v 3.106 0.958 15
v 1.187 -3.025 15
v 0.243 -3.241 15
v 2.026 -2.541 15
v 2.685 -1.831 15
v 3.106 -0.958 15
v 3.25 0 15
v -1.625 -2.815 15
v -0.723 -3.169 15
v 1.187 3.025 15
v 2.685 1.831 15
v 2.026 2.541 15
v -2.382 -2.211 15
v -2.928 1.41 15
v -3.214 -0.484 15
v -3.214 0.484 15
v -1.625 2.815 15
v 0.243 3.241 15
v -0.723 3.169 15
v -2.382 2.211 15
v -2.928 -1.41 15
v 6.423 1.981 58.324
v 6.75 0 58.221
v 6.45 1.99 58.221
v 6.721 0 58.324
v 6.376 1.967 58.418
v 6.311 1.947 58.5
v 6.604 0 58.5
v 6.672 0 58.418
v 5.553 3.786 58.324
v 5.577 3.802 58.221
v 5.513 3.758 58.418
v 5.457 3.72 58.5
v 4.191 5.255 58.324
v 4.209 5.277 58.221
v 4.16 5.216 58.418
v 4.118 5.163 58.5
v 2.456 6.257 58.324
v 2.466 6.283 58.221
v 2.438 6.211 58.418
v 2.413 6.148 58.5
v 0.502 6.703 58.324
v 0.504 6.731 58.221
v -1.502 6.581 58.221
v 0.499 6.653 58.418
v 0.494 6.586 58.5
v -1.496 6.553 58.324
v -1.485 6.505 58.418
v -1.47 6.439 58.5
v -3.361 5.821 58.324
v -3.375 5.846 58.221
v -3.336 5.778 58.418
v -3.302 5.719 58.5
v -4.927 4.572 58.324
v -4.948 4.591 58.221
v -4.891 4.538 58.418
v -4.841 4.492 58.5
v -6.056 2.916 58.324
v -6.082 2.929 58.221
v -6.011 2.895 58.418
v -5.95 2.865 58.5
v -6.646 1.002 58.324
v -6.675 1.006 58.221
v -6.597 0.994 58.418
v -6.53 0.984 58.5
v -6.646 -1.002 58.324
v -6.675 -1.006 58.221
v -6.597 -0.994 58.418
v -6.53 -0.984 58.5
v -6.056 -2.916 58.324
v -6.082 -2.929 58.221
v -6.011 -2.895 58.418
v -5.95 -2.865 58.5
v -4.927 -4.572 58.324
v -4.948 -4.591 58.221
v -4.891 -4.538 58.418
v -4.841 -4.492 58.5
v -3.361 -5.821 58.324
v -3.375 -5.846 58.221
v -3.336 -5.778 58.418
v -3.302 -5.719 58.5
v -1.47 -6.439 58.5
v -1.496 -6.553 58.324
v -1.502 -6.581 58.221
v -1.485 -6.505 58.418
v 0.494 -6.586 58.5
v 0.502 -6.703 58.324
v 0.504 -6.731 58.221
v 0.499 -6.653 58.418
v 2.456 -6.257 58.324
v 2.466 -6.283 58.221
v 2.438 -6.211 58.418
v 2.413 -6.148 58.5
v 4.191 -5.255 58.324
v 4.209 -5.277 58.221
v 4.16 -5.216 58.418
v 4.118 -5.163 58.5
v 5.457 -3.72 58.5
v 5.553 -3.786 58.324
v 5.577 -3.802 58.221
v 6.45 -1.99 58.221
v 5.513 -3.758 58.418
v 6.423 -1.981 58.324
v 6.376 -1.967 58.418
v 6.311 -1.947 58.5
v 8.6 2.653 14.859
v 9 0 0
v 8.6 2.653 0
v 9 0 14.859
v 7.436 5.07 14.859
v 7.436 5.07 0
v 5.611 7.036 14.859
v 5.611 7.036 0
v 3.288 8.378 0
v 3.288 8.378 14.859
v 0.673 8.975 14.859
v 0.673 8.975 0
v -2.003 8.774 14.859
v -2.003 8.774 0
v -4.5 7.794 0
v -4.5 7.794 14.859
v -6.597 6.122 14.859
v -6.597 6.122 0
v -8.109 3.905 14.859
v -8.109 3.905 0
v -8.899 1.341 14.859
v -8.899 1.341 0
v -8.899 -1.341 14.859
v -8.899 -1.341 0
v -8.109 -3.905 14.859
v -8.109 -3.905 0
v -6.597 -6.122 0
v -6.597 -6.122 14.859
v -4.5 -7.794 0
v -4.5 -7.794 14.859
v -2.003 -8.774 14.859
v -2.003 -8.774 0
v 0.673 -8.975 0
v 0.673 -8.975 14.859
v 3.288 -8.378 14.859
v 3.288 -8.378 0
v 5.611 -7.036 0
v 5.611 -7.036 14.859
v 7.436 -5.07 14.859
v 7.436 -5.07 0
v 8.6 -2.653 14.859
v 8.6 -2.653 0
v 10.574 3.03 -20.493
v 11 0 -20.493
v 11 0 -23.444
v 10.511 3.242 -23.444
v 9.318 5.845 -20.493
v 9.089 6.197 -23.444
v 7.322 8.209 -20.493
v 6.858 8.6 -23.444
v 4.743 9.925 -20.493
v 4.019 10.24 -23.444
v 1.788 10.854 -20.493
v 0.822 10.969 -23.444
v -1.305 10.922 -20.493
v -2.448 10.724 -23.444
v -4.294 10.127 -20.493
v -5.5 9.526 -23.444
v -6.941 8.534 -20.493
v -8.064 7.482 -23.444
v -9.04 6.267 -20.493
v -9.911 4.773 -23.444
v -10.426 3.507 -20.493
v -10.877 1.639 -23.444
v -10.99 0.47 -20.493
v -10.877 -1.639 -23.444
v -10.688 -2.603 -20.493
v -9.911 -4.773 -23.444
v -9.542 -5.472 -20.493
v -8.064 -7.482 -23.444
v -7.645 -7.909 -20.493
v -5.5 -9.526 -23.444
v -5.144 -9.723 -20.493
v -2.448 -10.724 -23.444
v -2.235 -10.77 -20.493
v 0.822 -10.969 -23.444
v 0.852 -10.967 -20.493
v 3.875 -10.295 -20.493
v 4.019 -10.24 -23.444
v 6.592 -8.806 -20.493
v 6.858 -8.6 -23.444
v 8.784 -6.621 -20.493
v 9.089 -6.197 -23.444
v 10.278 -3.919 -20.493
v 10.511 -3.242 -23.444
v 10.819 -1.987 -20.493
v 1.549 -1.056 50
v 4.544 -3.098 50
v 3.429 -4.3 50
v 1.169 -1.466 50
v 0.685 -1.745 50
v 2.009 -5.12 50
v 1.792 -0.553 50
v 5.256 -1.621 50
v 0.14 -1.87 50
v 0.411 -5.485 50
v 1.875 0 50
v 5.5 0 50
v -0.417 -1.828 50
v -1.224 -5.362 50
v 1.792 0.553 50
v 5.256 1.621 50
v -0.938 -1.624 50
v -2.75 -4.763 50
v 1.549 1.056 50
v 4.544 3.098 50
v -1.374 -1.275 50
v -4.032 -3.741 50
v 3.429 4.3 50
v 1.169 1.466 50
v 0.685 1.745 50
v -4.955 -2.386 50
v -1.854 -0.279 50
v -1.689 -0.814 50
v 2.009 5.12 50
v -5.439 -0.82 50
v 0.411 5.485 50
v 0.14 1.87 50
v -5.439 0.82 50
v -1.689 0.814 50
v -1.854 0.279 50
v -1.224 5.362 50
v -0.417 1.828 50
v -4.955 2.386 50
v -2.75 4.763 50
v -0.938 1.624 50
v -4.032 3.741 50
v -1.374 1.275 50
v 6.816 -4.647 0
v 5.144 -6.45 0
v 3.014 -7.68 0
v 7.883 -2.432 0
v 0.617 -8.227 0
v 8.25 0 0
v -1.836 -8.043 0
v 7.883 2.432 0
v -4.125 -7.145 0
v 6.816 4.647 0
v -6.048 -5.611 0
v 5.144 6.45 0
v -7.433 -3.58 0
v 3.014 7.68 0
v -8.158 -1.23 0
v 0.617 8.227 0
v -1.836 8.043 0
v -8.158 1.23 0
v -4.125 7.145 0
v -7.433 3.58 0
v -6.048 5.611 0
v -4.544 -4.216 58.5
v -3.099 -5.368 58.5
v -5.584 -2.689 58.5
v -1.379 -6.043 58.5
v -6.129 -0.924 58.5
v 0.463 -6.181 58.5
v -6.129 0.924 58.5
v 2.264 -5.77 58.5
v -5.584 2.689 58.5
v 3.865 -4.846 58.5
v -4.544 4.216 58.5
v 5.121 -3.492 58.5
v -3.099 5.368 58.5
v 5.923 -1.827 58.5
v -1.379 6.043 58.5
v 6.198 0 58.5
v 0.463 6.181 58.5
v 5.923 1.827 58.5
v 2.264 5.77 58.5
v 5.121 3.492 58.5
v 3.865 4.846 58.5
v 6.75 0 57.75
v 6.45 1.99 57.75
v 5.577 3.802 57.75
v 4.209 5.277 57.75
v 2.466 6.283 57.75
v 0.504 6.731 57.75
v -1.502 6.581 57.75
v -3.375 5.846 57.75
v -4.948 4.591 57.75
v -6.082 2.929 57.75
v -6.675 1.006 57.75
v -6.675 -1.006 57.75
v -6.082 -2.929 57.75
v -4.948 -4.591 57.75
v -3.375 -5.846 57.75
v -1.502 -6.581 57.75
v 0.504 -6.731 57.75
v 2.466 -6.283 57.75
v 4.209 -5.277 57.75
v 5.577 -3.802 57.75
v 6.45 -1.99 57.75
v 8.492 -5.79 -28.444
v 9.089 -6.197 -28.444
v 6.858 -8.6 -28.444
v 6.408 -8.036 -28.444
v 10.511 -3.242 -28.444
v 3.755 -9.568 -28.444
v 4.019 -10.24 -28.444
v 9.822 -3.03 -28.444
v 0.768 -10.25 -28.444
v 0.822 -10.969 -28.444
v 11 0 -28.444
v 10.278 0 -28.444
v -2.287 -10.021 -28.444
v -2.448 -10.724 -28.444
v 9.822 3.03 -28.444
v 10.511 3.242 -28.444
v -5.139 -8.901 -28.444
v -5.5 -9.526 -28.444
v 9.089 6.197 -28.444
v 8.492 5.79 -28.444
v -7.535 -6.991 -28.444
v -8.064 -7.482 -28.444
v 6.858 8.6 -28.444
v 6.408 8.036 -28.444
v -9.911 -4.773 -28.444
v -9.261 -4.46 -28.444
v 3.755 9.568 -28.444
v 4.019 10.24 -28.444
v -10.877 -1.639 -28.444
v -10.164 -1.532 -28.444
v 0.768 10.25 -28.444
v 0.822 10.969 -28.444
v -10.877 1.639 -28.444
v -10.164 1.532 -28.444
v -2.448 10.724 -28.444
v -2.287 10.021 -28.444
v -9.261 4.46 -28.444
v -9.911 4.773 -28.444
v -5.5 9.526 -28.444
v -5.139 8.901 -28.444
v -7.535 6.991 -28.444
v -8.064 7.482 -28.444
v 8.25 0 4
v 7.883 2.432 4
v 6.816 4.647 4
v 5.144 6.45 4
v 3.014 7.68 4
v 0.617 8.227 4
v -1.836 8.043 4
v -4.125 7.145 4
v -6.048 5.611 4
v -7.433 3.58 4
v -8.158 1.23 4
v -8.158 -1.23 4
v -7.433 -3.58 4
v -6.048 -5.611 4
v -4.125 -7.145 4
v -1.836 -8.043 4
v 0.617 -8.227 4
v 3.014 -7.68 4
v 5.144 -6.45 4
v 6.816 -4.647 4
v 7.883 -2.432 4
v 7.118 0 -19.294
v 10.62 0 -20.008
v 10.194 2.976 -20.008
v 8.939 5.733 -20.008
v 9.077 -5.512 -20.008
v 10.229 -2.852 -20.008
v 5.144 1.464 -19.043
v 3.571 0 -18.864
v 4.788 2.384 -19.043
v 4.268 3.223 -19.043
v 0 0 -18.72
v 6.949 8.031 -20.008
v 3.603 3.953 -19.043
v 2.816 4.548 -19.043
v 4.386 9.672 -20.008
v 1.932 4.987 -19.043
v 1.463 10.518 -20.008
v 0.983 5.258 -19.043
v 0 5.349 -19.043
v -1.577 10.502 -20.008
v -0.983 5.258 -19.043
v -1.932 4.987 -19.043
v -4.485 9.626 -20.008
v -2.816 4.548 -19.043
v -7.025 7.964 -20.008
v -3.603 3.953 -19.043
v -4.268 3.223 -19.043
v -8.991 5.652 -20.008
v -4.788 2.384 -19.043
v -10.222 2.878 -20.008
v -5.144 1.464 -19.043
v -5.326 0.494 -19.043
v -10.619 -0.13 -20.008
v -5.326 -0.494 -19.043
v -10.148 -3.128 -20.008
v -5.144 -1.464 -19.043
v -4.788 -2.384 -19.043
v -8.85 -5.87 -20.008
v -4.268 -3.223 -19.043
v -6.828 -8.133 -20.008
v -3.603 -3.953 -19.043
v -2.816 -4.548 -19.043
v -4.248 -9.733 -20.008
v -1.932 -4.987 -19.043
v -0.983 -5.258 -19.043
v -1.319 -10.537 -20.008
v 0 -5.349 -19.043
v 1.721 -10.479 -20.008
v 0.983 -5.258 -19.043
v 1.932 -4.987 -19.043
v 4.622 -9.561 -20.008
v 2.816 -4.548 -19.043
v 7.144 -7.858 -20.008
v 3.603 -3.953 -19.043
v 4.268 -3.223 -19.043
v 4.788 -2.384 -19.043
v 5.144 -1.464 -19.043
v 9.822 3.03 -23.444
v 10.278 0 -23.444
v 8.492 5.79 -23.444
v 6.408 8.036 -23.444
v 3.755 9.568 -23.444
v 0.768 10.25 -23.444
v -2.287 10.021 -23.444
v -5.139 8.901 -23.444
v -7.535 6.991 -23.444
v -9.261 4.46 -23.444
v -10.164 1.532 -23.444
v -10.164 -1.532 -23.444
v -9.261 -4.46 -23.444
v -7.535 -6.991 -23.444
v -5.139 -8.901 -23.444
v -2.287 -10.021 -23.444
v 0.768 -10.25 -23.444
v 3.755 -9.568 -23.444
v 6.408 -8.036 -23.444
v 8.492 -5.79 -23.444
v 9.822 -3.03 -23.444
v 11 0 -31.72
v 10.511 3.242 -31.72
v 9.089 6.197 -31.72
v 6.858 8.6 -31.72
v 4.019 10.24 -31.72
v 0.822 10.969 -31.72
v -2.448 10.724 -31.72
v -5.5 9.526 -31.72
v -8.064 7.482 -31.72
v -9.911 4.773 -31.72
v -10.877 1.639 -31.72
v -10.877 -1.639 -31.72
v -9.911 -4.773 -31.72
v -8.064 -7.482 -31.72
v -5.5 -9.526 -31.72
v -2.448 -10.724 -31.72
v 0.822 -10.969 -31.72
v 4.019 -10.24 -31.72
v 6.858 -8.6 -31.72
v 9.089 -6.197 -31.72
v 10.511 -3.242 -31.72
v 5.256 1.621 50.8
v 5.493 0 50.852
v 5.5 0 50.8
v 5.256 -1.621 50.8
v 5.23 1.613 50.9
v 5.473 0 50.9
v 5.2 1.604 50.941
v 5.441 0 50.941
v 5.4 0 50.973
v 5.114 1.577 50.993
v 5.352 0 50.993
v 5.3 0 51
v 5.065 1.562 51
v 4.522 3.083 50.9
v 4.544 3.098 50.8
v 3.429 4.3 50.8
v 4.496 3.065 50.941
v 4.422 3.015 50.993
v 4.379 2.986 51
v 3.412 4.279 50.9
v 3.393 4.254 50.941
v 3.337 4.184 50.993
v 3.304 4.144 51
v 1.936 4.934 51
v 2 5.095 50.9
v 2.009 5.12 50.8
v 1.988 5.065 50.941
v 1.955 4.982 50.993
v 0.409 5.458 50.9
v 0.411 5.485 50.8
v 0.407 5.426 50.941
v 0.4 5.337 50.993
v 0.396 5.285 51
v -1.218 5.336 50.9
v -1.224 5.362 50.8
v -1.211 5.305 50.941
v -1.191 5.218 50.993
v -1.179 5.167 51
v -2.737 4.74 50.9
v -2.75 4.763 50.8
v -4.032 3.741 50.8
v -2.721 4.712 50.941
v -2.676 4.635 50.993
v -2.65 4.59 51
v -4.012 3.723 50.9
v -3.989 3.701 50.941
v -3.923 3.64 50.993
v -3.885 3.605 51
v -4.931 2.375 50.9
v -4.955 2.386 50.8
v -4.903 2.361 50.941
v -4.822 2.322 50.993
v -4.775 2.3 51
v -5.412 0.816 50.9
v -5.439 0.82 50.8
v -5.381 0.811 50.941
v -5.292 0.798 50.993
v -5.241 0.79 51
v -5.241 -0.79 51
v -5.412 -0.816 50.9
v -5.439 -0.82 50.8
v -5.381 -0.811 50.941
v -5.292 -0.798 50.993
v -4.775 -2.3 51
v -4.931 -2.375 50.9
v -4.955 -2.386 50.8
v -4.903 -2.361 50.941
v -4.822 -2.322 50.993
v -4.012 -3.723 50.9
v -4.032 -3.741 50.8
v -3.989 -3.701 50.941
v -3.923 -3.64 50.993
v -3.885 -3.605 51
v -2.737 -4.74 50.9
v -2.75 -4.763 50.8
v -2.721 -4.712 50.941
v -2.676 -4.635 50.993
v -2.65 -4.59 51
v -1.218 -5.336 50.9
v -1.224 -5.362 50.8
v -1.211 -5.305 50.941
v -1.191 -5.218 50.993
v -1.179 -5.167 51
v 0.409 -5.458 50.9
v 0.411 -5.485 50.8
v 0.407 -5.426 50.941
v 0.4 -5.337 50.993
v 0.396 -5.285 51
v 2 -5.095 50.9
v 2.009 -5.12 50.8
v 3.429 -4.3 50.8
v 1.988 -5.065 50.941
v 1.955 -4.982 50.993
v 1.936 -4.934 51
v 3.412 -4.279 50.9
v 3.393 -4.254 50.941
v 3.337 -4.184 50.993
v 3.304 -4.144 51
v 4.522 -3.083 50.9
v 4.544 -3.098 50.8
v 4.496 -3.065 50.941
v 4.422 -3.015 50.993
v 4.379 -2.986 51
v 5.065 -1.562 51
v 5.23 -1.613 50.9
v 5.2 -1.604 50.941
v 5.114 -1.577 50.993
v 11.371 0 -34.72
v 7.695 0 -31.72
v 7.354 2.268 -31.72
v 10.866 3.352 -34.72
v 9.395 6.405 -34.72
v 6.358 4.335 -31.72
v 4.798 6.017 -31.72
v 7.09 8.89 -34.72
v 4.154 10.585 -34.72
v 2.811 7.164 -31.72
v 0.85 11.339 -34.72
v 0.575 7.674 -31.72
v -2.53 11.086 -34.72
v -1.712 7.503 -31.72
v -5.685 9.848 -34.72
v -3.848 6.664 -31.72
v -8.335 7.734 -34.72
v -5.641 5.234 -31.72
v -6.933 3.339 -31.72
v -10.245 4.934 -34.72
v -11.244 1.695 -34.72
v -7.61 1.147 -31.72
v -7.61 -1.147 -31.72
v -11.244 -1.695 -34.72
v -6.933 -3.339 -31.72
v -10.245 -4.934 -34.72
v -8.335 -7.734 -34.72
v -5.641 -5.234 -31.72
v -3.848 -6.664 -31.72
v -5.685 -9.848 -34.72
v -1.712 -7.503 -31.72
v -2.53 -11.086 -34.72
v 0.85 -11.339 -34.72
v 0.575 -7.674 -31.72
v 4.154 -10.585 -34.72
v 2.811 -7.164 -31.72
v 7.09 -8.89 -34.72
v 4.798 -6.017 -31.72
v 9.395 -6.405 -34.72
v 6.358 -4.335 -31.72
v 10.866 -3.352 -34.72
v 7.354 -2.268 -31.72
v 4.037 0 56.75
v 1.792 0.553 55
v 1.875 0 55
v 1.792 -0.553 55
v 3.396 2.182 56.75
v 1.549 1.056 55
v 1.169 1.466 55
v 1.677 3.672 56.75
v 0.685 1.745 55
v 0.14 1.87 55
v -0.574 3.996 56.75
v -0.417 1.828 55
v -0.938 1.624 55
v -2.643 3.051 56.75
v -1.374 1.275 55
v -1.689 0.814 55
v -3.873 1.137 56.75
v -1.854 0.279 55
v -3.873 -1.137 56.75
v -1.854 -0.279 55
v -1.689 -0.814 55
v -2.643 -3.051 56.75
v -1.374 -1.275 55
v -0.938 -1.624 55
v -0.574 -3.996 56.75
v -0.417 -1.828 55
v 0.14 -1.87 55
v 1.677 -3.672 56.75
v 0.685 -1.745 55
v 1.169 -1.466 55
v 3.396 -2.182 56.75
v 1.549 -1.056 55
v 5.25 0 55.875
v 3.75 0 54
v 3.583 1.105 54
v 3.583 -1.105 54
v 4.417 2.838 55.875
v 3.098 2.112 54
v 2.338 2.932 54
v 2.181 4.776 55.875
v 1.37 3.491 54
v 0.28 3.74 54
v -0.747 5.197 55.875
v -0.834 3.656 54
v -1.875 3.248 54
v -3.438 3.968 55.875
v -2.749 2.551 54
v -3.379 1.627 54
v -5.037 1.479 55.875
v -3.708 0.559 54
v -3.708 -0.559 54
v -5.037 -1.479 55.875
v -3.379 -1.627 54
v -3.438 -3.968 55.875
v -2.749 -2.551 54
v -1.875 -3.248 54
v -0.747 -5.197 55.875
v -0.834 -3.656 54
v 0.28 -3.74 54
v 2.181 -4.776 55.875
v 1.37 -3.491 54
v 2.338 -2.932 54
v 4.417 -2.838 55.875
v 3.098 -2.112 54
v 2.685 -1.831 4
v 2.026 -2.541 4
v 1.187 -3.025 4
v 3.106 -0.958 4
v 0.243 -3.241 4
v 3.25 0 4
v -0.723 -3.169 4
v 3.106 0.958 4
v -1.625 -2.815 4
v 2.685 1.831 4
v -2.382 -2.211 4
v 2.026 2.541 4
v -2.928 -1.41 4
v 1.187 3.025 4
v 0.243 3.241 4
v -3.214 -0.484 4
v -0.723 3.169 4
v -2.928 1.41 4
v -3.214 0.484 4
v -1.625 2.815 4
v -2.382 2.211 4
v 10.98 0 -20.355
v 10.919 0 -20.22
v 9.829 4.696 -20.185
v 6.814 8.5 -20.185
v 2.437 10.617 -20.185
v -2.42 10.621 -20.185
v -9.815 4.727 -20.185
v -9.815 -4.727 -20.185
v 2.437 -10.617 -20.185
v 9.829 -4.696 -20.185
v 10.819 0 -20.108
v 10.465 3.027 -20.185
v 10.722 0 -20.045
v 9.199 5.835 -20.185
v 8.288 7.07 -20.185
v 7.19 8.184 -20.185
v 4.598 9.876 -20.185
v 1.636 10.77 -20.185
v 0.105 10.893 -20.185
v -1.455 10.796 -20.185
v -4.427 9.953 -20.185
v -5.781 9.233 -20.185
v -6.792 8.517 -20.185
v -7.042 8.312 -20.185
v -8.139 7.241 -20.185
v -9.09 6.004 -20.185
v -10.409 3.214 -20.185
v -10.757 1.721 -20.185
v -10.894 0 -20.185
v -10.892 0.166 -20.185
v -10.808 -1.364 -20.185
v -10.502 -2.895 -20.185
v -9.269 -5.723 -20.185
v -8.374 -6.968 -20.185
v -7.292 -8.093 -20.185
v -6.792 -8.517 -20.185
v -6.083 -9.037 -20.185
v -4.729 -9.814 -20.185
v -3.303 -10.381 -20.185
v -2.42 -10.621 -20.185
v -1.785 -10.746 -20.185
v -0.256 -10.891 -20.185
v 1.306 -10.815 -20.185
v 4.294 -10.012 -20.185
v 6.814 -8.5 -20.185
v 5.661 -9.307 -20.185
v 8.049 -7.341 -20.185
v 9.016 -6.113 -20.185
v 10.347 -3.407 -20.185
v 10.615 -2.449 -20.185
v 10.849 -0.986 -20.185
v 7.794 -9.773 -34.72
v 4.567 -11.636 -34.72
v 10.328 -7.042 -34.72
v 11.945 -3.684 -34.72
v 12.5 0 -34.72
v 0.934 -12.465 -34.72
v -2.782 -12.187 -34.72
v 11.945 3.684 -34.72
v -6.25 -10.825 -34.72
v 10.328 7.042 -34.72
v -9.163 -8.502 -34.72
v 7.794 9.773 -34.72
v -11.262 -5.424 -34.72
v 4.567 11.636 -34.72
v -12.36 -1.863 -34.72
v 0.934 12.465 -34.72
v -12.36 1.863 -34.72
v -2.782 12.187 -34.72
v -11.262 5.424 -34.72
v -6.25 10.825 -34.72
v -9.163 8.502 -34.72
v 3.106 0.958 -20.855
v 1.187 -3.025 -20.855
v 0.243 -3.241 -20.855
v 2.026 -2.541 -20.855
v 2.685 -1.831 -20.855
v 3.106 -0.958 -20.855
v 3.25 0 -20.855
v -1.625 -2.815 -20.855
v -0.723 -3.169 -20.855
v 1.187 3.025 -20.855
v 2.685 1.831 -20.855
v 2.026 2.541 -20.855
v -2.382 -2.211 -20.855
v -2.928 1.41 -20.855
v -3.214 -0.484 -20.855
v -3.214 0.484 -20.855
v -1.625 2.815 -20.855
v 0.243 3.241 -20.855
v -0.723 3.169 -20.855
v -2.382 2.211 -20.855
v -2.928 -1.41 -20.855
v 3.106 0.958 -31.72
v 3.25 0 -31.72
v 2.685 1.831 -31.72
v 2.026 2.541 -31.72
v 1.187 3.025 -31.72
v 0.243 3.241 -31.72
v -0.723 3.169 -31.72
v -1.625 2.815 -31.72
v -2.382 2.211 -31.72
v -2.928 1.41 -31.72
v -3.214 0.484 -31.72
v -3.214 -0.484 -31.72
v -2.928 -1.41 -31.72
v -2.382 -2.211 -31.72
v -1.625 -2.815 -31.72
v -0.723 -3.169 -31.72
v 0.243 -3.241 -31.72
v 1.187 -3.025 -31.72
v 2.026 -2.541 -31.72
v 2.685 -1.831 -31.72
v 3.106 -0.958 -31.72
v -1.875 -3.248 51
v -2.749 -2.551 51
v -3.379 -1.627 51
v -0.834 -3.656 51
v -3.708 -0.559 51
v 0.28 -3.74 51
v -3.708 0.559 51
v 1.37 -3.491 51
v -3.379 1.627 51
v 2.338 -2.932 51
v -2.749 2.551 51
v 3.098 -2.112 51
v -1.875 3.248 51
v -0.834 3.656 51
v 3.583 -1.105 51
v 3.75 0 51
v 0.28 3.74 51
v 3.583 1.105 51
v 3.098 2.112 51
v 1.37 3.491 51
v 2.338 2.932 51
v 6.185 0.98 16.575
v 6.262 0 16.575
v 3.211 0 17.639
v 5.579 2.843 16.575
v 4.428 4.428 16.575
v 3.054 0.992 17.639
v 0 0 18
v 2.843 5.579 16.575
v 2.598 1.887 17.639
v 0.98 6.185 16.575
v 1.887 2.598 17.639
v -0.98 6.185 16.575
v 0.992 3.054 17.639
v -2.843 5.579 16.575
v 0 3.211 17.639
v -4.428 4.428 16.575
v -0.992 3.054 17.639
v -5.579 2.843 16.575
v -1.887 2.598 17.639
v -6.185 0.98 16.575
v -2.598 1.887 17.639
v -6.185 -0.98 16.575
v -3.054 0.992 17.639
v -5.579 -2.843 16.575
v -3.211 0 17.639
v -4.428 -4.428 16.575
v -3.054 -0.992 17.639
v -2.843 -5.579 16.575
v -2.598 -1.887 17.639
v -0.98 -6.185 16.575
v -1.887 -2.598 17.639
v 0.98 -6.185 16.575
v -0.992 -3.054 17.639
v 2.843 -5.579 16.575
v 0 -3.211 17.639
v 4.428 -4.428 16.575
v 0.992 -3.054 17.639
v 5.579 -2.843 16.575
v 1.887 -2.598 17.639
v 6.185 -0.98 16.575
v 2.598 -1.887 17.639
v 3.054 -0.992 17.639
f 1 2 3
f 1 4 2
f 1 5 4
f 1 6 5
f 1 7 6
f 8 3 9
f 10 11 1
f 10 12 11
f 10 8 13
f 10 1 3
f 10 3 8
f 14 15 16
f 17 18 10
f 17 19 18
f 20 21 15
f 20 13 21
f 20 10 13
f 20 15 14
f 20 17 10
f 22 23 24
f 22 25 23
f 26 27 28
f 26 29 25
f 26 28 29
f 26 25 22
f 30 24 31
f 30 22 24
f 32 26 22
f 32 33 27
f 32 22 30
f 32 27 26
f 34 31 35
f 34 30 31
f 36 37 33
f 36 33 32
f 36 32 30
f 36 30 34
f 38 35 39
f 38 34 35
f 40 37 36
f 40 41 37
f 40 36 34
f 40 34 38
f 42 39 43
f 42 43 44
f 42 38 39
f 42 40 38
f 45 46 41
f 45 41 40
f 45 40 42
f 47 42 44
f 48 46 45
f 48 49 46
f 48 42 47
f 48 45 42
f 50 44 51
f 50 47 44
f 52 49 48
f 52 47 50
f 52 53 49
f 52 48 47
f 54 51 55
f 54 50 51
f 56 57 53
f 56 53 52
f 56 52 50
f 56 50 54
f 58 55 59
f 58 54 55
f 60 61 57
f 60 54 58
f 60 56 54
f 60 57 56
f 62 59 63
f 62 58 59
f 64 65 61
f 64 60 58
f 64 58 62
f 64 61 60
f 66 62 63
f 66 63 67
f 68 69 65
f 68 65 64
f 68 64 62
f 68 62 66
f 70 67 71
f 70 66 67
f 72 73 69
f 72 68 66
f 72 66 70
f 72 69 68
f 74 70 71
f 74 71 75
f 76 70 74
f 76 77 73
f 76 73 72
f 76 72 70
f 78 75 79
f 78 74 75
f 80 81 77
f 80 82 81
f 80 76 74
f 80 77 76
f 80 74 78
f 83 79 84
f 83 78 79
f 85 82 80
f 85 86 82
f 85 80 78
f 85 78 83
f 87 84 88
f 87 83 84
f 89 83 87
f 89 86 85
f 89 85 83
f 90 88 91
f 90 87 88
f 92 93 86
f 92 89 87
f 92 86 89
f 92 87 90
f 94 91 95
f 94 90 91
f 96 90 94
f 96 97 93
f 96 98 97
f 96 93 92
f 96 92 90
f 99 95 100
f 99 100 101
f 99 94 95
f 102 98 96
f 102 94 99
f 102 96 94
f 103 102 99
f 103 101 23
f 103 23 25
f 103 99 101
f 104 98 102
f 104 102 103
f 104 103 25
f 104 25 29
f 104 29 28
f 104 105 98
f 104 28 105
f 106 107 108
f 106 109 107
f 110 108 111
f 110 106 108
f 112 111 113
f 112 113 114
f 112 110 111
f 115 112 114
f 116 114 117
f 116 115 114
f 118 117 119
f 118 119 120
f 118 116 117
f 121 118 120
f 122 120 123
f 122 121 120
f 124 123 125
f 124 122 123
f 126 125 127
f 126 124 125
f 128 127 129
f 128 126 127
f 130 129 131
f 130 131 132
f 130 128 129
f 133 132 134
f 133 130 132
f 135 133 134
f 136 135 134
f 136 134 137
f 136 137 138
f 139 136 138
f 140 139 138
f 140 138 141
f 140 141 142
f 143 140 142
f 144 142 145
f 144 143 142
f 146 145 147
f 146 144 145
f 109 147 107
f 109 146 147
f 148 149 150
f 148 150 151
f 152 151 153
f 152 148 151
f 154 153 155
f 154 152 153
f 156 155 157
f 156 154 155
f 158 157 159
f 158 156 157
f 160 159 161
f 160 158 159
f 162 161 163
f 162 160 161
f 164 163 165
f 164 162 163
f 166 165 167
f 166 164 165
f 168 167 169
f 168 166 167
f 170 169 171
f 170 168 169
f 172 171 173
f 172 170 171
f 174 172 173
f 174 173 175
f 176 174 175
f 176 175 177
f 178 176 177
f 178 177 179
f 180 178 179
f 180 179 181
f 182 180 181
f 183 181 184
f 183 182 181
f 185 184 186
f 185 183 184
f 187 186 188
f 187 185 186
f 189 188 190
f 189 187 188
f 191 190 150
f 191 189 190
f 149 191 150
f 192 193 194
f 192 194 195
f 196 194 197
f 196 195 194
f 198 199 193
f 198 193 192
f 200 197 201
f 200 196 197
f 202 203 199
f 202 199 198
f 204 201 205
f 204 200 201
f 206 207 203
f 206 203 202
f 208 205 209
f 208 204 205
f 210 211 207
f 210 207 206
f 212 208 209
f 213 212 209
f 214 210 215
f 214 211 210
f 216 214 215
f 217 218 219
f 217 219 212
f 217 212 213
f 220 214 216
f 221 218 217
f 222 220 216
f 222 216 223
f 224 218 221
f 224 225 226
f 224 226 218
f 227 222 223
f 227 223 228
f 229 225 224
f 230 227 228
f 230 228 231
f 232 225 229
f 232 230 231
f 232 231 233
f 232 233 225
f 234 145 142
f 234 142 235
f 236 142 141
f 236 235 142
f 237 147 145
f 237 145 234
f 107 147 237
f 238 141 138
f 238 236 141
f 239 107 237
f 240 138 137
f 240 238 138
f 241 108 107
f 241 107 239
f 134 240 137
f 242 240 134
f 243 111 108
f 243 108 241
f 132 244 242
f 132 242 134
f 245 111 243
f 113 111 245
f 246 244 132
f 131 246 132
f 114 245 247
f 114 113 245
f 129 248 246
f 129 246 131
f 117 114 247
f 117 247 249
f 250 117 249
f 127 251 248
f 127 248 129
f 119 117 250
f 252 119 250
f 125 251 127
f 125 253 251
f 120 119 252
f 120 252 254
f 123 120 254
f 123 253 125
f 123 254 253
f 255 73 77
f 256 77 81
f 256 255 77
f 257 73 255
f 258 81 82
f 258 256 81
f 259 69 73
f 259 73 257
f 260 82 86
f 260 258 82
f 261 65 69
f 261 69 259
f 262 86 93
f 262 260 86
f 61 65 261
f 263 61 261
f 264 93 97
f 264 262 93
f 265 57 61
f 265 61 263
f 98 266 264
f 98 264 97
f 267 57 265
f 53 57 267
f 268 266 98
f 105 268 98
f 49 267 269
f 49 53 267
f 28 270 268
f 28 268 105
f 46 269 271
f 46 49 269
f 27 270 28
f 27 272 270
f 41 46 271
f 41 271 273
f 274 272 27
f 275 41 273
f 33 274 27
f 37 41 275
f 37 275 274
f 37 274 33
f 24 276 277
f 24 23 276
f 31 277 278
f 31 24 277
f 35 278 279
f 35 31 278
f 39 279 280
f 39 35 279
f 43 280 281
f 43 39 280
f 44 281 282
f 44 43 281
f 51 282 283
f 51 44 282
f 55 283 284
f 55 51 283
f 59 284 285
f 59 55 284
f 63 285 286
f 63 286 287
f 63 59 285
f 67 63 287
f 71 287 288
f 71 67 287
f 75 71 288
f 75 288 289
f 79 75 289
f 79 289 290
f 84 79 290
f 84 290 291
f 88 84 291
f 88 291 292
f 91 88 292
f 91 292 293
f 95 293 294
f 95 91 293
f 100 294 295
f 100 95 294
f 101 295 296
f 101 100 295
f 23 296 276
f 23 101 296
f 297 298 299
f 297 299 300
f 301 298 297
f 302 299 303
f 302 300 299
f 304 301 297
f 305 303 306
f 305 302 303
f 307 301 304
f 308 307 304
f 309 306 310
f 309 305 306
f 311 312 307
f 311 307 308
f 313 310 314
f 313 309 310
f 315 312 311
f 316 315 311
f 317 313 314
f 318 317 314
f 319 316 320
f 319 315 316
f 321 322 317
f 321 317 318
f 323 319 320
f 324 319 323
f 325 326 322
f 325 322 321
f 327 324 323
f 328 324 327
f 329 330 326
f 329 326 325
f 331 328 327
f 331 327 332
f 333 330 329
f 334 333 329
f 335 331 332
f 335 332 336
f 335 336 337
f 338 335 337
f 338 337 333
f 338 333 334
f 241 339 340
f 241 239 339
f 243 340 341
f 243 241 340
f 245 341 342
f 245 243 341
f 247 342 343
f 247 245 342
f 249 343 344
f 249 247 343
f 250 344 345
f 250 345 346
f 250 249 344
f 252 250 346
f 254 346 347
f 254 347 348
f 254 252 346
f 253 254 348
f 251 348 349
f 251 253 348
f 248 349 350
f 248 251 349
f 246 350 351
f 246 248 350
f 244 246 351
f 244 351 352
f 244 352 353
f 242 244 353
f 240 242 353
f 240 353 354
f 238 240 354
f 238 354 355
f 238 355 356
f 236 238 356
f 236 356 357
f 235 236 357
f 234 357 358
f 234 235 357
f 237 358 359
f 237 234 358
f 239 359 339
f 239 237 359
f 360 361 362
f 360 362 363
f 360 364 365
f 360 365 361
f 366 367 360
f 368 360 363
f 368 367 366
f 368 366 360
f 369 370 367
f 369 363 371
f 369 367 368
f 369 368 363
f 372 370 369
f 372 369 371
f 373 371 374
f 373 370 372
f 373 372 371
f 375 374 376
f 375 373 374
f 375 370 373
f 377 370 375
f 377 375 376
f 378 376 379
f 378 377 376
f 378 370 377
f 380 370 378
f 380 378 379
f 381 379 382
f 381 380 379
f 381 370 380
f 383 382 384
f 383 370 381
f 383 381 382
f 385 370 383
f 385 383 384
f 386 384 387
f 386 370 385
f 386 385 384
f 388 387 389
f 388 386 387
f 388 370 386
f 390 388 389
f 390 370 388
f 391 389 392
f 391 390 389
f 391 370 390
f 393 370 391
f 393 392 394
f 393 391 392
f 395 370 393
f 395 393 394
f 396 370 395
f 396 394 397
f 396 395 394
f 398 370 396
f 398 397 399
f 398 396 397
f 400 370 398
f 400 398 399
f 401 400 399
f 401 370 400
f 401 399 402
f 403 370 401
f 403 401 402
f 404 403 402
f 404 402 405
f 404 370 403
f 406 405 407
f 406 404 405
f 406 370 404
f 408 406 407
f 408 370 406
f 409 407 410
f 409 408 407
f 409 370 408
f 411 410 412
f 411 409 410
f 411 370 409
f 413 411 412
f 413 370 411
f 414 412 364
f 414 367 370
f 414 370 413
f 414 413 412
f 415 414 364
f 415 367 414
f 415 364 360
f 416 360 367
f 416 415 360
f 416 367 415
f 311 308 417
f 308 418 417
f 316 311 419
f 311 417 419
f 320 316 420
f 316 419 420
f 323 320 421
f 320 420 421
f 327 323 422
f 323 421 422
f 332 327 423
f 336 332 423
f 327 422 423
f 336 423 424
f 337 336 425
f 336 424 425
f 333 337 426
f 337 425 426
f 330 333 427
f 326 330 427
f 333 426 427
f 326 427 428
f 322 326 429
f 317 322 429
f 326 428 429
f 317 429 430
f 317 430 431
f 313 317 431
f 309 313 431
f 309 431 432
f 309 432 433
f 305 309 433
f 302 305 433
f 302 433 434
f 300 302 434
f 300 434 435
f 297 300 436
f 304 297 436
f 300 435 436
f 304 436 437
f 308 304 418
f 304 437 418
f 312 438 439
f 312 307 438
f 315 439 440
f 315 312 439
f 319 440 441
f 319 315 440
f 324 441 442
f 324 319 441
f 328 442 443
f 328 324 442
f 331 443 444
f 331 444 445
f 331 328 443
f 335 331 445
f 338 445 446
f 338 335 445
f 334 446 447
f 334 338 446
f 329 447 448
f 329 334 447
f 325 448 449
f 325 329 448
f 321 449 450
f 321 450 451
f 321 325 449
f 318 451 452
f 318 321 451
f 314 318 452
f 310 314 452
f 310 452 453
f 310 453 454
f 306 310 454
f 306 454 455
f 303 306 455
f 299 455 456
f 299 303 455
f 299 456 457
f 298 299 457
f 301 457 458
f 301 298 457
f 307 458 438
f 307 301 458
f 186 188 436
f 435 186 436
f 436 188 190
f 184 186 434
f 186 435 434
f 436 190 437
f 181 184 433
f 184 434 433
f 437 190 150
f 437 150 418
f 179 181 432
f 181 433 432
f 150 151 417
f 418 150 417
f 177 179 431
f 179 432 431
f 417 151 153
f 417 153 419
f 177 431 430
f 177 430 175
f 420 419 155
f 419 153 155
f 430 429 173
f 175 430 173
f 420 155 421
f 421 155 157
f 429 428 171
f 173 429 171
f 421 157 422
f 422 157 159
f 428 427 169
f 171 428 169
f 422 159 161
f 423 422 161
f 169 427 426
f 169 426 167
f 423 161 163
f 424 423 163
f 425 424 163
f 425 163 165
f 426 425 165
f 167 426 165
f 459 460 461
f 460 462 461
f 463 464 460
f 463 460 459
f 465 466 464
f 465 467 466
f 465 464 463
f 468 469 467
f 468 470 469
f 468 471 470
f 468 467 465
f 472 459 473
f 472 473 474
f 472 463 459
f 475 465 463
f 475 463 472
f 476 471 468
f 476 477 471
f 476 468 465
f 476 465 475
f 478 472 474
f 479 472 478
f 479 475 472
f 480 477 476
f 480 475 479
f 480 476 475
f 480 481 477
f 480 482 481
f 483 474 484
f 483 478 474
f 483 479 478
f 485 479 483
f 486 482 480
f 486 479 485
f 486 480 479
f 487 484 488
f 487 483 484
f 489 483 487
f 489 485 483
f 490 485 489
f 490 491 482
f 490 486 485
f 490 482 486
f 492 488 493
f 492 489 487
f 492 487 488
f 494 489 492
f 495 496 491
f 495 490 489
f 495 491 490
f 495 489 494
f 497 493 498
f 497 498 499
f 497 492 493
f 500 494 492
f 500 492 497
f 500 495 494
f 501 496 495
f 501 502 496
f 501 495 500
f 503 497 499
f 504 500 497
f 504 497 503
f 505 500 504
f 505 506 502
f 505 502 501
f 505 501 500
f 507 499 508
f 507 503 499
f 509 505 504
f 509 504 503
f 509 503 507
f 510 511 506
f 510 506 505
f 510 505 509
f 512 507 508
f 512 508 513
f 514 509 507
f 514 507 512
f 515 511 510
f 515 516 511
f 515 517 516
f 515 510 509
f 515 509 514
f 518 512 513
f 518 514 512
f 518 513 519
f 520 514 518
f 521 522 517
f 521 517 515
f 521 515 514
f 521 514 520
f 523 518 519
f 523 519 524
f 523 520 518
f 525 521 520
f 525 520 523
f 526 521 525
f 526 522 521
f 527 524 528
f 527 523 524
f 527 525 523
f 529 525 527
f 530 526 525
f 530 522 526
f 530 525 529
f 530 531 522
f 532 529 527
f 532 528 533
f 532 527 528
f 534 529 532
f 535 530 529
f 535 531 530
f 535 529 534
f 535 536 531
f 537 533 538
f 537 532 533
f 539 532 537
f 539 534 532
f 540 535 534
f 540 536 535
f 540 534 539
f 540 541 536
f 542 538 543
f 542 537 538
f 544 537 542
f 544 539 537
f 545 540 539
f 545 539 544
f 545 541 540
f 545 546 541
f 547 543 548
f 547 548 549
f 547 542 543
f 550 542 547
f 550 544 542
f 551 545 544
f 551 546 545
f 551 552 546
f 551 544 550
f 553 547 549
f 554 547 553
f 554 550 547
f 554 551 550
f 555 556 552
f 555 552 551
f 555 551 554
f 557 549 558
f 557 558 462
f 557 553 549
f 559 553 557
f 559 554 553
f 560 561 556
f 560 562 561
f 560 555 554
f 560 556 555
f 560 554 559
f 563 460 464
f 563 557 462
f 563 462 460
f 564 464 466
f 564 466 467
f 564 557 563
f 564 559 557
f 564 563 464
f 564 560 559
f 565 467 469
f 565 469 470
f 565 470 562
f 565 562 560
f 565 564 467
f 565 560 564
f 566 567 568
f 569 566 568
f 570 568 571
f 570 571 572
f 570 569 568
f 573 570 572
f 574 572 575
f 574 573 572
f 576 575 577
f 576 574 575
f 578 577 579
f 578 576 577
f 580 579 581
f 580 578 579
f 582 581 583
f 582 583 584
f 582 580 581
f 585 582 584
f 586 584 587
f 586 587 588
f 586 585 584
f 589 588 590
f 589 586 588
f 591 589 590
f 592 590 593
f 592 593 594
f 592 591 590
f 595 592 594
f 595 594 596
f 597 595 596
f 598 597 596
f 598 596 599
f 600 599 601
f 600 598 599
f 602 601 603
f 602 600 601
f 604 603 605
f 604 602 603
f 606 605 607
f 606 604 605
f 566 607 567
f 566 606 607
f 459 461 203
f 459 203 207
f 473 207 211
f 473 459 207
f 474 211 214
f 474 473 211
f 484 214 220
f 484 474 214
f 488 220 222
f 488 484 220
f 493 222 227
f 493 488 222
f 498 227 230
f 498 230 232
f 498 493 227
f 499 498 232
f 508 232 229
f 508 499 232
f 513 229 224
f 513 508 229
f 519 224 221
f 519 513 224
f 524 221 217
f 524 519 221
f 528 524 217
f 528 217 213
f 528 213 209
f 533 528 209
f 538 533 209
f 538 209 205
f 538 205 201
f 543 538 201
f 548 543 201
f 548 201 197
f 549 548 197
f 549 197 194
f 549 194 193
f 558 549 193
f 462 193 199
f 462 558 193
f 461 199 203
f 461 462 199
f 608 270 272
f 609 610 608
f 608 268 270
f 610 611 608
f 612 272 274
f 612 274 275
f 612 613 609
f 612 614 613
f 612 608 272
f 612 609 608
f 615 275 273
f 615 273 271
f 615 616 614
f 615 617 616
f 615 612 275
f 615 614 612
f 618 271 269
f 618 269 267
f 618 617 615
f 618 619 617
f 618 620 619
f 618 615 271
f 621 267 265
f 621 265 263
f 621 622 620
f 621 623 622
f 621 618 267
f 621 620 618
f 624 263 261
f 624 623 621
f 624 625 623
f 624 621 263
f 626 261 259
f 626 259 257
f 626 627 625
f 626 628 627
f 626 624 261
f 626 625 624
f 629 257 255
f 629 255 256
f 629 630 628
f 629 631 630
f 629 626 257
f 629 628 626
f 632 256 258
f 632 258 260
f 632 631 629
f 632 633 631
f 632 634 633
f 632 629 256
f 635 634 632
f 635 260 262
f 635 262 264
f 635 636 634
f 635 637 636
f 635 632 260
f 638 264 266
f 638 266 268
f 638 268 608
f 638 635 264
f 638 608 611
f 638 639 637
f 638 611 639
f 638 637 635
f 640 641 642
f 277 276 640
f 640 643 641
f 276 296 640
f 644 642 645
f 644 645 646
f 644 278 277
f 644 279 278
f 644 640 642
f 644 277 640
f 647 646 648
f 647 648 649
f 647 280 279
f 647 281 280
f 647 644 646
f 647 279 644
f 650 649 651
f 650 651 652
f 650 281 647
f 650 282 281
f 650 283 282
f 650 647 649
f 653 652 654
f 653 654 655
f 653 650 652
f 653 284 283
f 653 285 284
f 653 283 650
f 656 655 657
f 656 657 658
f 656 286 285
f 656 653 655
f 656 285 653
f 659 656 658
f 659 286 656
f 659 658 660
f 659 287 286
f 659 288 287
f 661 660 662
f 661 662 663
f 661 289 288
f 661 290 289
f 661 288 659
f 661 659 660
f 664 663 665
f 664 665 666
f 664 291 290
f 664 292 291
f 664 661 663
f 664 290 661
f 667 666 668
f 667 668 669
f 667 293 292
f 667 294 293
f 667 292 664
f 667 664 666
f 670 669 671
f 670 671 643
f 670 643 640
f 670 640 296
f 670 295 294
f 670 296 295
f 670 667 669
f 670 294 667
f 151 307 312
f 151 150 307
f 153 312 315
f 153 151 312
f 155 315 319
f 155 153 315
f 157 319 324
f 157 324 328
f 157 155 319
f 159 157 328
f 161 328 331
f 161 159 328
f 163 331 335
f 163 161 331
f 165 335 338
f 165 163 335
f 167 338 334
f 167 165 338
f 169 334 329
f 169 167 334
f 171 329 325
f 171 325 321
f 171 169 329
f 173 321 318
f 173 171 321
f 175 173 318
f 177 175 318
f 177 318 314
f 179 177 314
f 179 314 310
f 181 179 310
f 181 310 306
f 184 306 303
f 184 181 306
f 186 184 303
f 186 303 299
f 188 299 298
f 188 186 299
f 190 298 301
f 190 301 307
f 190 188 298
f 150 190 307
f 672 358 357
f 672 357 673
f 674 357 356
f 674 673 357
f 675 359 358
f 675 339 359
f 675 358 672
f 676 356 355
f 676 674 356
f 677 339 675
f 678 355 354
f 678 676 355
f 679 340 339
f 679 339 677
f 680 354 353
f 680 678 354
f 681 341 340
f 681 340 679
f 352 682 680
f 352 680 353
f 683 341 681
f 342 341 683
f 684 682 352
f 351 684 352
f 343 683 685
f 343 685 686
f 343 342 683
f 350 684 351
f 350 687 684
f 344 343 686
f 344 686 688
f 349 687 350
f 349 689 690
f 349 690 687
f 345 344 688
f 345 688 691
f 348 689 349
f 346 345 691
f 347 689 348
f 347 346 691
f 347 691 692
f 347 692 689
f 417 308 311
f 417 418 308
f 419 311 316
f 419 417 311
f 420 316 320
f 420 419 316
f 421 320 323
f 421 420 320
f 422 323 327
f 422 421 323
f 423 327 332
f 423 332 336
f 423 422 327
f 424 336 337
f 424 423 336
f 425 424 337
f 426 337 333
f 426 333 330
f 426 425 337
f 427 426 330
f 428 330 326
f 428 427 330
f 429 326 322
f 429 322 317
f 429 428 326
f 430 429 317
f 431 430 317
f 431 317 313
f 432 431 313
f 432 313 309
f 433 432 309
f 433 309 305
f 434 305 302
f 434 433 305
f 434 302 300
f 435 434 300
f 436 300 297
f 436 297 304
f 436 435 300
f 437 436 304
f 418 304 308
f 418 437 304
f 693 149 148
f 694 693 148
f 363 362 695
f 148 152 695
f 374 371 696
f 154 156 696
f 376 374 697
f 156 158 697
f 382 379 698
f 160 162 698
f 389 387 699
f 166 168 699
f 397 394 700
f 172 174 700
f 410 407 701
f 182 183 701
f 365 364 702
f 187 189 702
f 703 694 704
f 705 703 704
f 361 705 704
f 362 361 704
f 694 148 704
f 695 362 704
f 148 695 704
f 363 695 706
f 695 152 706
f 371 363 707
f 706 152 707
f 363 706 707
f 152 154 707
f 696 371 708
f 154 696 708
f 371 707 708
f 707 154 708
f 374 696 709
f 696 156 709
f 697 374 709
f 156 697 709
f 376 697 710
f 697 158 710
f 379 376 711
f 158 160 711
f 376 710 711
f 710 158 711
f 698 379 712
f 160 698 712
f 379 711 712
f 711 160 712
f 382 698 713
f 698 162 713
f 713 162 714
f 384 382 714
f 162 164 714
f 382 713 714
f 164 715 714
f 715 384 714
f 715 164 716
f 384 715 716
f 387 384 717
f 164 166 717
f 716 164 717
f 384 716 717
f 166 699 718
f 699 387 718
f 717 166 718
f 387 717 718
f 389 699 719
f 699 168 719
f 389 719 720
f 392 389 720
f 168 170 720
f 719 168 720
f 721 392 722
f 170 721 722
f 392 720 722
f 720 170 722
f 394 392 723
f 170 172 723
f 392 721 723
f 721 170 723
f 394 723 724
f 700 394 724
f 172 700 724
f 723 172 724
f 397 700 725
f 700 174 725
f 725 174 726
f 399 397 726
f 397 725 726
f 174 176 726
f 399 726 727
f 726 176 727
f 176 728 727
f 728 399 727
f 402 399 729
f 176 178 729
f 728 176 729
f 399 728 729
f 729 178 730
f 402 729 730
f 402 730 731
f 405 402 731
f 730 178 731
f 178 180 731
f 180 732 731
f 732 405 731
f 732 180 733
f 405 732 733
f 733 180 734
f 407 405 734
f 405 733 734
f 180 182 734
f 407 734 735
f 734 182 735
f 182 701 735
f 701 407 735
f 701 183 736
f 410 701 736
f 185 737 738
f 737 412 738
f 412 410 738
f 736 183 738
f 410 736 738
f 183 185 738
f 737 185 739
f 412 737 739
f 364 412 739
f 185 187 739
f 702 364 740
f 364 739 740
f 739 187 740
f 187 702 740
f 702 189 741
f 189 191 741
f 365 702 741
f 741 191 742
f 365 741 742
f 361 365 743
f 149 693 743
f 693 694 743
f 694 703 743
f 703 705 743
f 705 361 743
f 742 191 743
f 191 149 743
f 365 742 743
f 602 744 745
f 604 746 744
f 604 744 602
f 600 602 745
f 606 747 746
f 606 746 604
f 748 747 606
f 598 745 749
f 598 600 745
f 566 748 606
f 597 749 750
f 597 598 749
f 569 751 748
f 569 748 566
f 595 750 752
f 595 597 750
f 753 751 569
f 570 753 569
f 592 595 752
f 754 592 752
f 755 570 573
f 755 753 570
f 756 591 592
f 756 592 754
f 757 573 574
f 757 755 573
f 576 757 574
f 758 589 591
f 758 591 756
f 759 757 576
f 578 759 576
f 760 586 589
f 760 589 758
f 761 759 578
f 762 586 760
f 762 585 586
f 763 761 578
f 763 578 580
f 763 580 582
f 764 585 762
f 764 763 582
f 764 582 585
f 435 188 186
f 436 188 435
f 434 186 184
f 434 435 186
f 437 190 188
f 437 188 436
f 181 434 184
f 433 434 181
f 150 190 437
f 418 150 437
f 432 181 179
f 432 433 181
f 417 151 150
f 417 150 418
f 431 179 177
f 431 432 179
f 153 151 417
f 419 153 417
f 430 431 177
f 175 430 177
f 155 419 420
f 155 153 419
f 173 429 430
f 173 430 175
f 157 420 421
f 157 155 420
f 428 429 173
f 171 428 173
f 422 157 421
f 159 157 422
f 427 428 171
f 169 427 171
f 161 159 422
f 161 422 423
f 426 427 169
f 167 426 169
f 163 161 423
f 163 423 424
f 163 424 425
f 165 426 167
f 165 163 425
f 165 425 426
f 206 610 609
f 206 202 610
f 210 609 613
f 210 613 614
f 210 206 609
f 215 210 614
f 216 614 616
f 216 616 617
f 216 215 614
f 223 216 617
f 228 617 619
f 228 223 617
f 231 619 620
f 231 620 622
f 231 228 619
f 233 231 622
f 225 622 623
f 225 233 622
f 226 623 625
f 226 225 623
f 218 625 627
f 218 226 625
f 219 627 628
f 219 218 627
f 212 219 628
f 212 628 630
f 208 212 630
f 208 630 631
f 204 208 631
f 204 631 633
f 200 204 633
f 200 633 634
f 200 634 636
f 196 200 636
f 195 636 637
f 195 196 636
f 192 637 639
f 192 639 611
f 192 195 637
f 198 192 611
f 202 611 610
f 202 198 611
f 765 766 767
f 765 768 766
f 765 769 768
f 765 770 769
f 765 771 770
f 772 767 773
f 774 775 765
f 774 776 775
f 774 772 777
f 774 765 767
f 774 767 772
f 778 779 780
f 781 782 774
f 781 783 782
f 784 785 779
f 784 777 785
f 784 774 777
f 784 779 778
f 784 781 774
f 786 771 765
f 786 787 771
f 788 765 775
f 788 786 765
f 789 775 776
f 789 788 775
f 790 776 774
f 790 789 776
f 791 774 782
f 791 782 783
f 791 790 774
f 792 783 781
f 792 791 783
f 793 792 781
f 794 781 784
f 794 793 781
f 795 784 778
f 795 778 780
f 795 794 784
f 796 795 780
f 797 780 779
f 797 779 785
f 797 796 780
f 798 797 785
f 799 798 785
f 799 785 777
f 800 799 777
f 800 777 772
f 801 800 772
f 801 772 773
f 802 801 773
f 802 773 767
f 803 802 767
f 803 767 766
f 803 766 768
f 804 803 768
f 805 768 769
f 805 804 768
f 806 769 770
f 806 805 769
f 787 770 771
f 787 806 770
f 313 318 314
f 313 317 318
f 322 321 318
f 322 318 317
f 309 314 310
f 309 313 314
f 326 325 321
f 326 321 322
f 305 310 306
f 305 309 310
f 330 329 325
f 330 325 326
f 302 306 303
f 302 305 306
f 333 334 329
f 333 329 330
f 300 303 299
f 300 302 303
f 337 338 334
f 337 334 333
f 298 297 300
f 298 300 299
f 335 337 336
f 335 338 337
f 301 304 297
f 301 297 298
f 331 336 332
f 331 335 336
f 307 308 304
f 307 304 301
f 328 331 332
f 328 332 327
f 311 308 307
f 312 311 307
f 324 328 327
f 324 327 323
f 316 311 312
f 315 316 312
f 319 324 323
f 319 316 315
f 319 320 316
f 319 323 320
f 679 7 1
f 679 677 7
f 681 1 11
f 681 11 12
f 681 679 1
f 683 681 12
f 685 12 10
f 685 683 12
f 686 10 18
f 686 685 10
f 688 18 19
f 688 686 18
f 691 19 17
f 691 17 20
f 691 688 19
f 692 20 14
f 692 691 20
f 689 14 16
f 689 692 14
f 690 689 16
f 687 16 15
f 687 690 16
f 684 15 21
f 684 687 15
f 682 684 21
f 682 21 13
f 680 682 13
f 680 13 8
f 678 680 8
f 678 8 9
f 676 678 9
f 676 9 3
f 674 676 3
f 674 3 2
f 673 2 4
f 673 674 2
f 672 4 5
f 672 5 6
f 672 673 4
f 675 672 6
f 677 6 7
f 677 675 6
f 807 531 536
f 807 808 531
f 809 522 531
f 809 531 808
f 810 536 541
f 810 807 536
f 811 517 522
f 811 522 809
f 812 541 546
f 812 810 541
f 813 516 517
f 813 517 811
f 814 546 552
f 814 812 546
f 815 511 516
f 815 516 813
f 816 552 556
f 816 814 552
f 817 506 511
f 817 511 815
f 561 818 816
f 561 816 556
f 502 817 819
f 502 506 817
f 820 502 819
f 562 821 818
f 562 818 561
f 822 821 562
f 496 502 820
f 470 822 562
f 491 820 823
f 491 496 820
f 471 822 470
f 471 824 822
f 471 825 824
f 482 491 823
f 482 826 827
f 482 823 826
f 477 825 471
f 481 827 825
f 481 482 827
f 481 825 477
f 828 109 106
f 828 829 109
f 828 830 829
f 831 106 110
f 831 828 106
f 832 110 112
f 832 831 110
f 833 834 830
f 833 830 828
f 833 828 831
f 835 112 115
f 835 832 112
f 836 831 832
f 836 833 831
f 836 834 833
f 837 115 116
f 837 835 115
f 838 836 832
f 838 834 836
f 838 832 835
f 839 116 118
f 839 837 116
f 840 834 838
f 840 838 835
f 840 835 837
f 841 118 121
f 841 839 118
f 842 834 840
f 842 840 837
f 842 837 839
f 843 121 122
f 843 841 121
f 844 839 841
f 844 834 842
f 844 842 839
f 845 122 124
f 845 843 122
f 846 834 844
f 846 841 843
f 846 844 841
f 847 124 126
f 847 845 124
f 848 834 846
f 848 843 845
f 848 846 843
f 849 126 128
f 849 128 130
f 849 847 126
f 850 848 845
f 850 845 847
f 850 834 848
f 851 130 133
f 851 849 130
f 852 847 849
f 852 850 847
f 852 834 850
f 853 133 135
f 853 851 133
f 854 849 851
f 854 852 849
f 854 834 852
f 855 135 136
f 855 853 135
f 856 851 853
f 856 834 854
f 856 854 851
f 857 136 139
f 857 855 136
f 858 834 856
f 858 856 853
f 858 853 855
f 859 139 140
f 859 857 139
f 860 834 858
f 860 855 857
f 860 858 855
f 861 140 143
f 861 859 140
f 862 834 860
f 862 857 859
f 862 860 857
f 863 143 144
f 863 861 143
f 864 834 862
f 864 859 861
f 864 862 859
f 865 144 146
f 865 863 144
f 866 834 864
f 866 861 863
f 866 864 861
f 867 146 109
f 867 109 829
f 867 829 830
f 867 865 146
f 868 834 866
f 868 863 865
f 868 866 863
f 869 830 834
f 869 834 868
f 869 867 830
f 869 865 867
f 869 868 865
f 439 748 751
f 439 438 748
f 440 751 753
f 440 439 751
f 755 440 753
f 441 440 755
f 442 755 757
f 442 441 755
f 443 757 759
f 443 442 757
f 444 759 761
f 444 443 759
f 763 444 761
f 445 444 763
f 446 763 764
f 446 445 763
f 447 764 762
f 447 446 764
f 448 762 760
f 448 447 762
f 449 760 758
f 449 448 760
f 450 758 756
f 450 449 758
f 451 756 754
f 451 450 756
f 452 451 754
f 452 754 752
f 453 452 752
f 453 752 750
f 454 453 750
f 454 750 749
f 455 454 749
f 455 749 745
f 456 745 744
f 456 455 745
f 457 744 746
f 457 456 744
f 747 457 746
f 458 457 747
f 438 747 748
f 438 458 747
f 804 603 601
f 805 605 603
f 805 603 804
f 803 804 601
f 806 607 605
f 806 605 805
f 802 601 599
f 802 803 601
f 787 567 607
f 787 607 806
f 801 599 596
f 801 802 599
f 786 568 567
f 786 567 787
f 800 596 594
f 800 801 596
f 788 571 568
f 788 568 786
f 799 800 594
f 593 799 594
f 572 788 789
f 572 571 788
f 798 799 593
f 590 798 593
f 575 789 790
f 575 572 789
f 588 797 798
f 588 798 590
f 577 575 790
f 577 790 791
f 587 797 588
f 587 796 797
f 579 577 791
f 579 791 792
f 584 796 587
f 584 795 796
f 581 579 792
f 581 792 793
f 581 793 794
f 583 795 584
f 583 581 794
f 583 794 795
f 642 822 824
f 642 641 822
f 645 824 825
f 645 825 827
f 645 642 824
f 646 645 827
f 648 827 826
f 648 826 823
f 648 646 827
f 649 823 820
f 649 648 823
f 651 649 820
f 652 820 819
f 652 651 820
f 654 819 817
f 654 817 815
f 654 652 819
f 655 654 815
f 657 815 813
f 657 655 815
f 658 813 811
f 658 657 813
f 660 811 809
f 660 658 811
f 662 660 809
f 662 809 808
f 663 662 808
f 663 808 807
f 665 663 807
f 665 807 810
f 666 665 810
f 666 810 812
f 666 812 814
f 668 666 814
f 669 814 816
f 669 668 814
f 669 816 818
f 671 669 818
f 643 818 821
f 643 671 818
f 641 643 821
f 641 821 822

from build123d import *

# Parameters (mm, degrees)
F2_W = 1.875
F2_H = 3
F4_R = 0.2
F5_W = 0.7215710953
F5_H = 5
F8_R = 0.5


with BuildPart() as f1:
    # F0 (on Front) → F1 (revolve)
    with BuildSketch(Plane.XZ):
        with BuildLine():
            Line((0, 18), (0, 15))
            Line((0, 15), (3.25, 15))
            Line((3.25, 15), (3.25, 4))
            Line((3.25, 4), (8.25, 4))
            Line((8.25, 4), (8.25, 0))
            Line((8.25, 0), (9, 0))
            Line((9, 0), (9, 14.8594207869))
            ThreePointArc((9, 14.8594207869), (4.7661105158, 17.1923068699), (0, 18))
        make_face()
    revolve(axis=Axis((0, 0, 9), (0, 0, 1)))


with BuildPart() as f3:
    # F2 (on Front) → F3 (revolve)
    with BuildSketch(Plane.XZ):
        with BuildLine():
            Line((1.875, 55), (1.875, 54))
            Line((1.875, 54), (3.75, 54))
            Line((3.75, 54), (6.75, 57.75))
            Line((6.75, 57.75), (6.75, 58.0503940582))
            Line((6.75, 58.0503940582), (6.75, 58.2212944026))
            ThreePointArc((6.75, 58.2212944026), (6.6990989647, 58.3721854813), (6.6041122191, 58.5))
            Line((6.6041122191, 58.5), (6.1982930638, 58.5))
            Line((6.1982930638, 58.5), (1.875, 55))
        make_face()
        with Locations((2.8125, 52.5)):
            Rectangle(F2_W, F2_H)
        Polygon((1.875, 51), (1.875, 50), (5.5, 50), (5.5, 51), (3.75, 51), align=None)
    revolve(axis=Axis((0, 0, 54.25), (0, 0, 1)))

    # F4
    f4_edges = [f3.edges().sort_by_distance(p)[0] for p in [
        (-5.5, 0, 51),
    ]]
    fillet(f4_edges, radius=F4_R)


with BuildPart() as f6:
    # F5 (on Front) → F6 (revolve)
    with BuildSketch(Plane.XZ):
        with BuildLine():
            Line((3.25, -31.7198918813), (7.69546628, -31.7198918813))
            Line((7.69546628, -31.7198918813), (11, -31.7198918813))
            Line((11, -31.7198918813), (11, -28.4436289221))
            Line((11, -28.4436289221), (10.2784289047, -28.4436289221))
            Line((10.2784289047, -28.4436289221), (10.2784289047, -23.4436289221))
            Line((10.2784289047, -23.4436289221), (11, -23.4436289221))
            Line((11, -23.4436289221), (11, -20.1032764325))
            ThreePointArc((11, -20.1032764325), (5.5433237506, -19.0670947983), (0, -18.7198918813))
            Line((0, -18.7198918813), (0, -20.8550542593))
            Line((0, -20.8550542593), (3.25, -20.8550542593))
            Line((3.25, -20.8550542593), (3.25, -31.7198918813))
        make_face()
        Polygon((7.69546628, -31.7198918813), (11.3709494472, -34.7198918813), (12.5, -34.7198918813), (11, -31.7198918813), align=None)
    revolve(axis=Axis((0, 0, -26.2874730703), (0, 0, 1)))

    # F8
    f8_edges = [f6.edges().sort_by_distance(p)[0] for p in [
        (-11, 0, -20.103276),
    ]]
    fillet(f8_edges, radius=F8_R)


with BuildPart() as f7:
    # F5 (on Front) → F7 (revolve)
    with BuildSketch(Plane.XZ):
        with Locations((10.6392144524, -25.9436289221)):
            Rectangle(F5_W, F5_H)
    revolve(axis=Axis((0, 0, -28.4436289221), (0, 0, 1)))


solid = Compound([f1.part, f3.part, f6.part, f7.part])
